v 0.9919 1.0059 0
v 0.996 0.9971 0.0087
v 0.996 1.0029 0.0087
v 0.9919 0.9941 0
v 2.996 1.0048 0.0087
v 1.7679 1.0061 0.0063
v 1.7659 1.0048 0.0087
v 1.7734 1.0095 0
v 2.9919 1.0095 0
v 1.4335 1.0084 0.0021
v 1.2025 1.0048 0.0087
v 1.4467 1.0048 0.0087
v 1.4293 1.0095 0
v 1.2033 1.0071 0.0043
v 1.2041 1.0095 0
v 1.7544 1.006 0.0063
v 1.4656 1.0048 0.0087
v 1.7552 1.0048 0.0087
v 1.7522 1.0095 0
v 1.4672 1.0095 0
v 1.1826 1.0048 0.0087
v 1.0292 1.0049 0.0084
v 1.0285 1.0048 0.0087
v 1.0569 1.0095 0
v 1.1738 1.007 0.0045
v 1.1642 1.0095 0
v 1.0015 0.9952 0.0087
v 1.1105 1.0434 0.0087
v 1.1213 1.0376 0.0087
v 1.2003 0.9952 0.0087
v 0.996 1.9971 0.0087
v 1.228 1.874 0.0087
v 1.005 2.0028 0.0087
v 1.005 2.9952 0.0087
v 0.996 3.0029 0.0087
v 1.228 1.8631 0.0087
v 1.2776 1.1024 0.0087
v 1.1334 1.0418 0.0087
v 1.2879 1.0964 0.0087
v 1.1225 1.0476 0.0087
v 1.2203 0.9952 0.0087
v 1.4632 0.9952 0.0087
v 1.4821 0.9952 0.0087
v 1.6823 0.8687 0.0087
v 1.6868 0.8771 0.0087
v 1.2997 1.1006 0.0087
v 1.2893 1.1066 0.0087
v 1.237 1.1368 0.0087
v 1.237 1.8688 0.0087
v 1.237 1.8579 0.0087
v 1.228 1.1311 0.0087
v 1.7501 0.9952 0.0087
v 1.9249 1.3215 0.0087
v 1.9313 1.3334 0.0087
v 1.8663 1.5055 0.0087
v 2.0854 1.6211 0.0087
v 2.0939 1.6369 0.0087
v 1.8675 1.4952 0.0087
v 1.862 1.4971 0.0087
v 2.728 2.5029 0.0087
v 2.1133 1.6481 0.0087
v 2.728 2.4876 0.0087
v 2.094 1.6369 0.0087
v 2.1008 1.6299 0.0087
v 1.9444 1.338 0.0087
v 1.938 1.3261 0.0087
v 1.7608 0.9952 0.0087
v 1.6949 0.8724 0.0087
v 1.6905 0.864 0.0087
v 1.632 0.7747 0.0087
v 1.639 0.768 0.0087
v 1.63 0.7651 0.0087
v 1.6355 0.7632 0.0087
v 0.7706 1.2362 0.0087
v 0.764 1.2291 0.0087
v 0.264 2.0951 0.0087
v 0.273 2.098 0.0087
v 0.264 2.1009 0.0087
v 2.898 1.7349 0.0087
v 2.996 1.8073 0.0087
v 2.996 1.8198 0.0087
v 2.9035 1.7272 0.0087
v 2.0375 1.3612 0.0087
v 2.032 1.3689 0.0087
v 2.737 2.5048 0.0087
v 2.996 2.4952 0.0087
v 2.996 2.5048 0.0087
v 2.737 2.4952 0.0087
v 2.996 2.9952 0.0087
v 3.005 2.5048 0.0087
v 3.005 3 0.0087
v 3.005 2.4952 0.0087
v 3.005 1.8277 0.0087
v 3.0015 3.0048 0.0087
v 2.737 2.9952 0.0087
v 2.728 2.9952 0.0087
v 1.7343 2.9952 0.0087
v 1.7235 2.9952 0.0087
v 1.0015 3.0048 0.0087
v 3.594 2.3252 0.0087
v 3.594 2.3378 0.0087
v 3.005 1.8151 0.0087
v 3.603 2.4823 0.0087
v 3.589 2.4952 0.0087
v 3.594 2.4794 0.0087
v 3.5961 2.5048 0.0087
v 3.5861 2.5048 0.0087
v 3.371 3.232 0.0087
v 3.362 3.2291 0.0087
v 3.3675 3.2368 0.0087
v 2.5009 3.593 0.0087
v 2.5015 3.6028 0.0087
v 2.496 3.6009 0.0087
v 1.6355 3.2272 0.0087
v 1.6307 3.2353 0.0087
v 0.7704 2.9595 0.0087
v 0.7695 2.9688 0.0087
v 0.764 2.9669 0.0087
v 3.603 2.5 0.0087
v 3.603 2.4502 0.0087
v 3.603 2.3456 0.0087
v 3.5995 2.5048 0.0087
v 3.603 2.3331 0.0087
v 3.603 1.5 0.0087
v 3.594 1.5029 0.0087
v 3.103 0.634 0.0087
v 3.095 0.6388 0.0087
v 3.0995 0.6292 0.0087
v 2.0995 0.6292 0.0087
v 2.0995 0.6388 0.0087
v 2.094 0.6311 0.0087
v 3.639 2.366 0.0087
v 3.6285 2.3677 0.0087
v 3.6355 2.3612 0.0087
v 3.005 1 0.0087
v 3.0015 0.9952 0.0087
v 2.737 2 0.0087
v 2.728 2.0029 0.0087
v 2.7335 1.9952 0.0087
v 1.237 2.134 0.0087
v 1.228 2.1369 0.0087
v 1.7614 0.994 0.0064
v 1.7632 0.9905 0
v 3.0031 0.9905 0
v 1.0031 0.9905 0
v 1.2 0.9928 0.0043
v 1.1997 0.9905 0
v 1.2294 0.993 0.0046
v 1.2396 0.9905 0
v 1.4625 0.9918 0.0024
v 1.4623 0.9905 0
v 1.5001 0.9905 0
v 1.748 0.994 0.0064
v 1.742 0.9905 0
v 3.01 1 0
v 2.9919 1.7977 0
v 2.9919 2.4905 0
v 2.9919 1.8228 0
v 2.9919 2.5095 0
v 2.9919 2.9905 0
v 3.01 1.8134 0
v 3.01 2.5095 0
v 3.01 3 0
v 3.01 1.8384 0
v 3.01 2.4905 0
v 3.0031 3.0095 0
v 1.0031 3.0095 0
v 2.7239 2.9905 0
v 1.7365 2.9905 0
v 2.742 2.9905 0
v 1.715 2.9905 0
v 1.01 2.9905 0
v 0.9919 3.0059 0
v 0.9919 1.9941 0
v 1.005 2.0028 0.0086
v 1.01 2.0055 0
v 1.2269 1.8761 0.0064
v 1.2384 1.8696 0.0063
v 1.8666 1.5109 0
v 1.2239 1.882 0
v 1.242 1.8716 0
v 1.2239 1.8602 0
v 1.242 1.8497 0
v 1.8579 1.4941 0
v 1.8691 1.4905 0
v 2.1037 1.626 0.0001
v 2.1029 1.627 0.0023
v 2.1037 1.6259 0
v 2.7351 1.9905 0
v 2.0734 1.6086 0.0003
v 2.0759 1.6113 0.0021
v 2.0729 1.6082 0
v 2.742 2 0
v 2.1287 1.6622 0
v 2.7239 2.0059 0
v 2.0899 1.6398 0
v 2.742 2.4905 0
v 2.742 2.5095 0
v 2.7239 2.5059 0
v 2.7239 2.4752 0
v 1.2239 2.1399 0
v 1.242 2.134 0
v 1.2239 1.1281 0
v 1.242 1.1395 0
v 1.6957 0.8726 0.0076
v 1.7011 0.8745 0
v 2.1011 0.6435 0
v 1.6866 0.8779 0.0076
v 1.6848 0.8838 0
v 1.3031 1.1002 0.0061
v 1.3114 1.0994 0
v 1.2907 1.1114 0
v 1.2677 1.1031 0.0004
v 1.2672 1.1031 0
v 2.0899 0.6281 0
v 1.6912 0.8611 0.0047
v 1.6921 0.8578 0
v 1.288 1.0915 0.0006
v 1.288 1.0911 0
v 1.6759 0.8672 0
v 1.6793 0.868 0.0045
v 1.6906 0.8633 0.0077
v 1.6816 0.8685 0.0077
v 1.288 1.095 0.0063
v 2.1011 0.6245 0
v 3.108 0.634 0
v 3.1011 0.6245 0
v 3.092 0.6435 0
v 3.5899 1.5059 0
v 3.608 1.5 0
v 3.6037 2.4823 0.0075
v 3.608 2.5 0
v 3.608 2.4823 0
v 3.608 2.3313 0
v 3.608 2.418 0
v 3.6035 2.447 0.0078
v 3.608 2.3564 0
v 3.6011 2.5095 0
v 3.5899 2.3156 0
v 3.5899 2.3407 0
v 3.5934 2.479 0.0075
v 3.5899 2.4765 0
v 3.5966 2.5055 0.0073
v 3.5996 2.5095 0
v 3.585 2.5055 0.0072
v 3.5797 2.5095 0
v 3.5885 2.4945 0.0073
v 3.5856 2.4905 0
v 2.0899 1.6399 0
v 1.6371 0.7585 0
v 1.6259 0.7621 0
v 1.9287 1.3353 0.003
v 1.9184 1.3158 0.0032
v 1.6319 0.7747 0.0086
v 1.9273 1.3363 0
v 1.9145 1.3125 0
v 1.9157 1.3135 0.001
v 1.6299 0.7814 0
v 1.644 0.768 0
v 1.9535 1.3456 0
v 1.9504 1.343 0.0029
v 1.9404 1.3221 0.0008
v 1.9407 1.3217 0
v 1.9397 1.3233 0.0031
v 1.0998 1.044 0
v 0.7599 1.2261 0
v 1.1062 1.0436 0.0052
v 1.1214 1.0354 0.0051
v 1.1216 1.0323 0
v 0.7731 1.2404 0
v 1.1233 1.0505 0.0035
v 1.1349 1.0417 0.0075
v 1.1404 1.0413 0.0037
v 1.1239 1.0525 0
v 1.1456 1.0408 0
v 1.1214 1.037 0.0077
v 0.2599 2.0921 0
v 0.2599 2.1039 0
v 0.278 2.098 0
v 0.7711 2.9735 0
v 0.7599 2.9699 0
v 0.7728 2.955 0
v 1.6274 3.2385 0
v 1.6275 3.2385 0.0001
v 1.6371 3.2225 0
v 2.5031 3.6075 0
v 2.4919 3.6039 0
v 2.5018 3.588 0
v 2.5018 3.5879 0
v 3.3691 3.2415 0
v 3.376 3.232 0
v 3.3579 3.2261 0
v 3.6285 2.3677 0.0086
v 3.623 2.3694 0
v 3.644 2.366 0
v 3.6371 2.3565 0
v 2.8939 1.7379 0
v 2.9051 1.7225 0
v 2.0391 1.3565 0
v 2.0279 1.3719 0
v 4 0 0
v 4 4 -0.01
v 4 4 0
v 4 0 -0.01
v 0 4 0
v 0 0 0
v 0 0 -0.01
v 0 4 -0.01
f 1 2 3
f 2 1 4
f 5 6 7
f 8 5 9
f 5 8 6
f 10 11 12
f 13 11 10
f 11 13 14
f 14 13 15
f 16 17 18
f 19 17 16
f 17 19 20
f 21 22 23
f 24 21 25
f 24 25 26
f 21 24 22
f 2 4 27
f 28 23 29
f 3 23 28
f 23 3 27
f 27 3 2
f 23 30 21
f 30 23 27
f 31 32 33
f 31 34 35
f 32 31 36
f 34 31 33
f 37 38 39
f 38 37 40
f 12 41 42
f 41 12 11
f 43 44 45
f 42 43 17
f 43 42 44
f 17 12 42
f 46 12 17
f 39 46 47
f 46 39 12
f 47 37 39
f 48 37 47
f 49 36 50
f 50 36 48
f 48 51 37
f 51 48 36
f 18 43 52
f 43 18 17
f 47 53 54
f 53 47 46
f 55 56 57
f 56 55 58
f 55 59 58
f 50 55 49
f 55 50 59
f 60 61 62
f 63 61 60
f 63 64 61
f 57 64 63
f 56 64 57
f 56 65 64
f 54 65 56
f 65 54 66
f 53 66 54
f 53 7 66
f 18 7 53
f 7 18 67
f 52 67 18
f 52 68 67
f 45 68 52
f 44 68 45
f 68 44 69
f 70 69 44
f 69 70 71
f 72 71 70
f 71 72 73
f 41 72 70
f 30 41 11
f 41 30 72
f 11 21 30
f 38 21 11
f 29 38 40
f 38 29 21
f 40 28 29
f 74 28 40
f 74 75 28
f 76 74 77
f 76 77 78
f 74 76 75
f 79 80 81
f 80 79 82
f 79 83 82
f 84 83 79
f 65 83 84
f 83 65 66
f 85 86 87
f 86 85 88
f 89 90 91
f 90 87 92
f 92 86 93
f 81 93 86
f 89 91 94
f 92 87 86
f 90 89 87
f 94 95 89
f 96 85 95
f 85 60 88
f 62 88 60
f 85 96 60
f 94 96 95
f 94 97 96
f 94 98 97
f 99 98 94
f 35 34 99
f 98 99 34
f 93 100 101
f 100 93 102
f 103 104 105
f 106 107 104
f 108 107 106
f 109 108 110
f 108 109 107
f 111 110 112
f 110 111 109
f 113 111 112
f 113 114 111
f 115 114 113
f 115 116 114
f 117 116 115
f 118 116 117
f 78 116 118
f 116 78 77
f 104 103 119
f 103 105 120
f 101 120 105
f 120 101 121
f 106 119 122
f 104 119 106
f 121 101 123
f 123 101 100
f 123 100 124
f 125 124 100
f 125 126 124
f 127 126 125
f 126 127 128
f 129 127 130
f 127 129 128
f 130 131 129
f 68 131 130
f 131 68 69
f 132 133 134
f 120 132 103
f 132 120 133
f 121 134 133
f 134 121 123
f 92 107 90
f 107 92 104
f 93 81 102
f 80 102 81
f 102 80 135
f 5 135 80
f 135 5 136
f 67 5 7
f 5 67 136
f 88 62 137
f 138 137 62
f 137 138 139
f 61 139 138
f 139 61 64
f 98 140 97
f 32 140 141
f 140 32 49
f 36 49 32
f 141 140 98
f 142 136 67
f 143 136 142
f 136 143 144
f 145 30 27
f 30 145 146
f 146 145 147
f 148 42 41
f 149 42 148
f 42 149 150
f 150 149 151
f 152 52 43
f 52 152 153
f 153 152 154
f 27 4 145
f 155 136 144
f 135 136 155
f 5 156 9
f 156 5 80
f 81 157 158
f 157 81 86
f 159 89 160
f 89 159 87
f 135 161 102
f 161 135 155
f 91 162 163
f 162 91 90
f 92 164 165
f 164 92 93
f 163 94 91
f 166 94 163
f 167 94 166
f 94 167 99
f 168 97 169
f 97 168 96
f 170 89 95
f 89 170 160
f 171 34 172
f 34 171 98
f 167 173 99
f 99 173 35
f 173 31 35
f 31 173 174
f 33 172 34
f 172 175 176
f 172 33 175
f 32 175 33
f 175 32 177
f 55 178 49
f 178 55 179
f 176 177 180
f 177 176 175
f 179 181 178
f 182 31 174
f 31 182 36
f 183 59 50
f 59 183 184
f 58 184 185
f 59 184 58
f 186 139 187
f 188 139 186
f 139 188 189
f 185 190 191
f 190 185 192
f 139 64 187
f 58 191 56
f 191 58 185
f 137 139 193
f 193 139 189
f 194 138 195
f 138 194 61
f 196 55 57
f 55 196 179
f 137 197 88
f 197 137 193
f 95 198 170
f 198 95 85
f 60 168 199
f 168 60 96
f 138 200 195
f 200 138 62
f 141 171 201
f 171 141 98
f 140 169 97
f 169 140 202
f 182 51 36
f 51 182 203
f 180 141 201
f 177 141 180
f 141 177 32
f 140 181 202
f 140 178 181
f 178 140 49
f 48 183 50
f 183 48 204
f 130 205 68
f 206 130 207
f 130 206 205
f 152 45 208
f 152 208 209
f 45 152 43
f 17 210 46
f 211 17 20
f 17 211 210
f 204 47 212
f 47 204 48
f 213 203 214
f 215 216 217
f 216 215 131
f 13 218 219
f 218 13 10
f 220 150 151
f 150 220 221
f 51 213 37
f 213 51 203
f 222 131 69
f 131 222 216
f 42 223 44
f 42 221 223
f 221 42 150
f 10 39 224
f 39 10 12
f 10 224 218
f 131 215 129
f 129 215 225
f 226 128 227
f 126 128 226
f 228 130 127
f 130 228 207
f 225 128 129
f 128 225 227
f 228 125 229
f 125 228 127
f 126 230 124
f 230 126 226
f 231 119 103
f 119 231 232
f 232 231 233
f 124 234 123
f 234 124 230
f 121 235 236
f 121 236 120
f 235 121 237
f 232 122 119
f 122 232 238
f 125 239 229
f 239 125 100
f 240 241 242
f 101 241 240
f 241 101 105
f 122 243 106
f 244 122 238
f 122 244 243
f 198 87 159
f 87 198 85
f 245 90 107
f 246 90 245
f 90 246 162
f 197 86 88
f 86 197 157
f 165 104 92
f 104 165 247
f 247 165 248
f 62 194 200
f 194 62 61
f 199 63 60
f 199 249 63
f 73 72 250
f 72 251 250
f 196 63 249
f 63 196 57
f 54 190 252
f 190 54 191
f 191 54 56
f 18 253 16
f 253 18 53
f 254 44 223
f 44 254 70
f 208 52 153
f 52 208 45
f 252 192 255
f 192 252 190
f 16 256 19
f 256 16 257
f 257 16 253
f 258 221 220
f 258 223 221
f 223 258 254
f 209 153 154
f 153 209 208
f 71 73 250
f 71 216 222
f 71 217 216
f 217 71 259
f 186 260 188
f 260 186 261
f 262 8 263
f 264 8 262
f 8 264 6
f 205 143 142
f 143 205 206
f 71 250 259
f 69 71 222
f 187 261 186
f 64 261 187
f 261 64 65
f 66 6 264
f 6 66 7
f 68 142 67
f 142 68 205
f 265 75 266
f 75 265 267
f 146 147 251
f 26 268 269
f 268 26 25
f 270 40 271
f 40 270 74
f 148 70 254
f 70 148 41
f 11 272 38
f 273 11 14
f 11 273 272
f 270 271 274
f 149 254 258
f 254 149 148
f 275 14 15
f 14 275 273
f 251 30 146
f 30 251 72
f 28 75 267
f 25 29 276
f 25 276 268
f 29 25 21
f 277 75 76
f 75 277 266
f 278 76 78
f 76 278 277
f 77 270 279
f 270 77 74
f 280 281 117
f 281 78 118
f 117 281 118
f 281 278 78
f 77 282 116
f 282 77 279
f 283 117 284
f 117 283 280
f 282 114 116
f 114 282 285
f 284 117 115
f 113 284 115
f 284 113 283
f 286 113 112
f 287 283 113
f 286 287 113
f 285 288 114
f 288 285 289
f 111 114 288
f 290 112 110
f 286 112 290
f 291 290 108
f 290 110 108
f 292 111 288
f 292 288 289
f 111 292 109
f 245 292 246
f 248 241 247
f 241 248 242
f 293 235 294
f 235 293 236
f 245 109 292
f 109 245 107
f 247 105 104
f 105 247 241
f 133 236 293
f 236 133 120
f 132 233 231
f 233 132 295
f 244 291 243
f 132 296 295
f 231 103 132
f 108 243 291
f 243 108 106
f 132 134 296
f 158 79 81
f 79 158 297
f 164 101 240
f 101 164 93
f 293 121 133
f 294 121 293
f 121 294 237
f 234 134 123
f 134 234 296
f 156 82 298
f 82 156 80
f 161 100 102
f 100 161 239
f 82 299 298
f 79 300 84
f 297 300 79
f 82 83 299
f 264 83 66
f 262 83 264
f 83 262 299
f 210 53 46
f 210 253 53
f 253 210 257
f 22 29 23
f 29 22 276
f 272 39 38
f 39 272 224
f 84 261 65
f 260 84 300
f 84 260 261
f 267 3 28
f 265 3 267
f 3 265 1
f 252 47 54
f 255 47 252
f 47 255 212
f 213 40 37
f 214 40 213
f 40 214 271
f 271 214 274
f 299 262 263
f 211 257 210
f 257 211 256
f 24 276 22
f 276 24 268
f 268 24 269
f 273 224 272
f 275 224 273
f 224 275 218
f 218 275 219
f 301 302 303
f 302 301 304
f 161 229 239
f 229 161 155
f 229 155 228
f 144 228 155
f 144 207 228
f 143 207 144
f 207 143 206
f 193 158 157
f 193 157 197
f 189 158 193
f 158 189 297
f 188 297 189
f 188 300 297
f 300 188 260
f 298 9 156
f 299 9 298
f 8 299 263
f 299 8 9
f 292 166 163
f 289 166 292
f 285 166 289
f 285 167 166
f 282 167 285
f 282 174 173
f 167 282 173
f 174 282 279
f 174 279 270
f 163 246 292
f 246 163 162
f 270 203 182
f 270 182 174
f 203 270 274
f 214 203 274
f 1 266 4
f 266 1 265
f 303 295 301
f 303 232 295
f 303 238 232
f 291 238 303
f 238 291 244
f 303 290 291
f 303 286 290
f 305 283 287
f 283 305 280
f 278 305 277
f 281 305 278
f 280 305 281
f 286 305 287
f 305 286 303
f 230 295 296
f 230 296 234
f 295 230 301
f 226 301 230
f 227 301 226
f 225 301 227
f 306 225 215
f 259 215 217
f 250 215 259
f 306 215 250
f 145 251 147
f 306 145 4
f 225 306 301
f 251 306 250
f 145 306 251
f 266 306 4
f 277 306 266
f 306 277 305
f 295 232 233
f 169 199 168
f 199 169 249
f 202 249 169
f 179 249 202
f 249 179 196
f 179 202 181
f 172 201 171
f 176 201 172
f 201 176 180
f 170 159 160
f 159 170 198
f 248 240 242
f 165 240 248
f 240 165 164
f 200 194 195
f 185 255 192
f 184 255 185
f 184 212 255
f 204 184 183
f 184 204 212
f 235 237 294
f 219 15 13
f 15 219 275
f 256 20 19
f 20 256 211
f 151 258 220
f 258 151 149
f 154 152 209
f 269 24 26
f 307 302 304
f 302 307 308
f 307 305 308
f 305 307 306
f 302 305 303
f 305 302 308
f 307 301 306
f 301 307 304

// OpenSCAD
hull(){
    translate([1, 1]) sphere(0.01);
    translate([2, 1]) sphere(0.01);
}
hull(){
    translate([2, 1]) sphere(0.01);
    translate([3, 1]) sphere(0.01);
}
hull(){
    translate([3, 1]) sphere(0.01);
    translate([3, 2]) sphere(0.01);
}
hull(){
    translate([3, 2]) sphere(0.01);
    translate([3, 3]) sphere(0.01);
}
hull(){
    translate([3, 3]) sphere(0.01);
    translate([2, 3]) sphere(0.01);
}
hull(){
    translate([2, 3]) sphere(0.01);
    translate([1, 3]) sphere(0.01);
}
hull(){
    translate([1, 3]) sphere(0.01);
    translate([1, 2]) sphere(0.01);
}
hull(){
    translate([1, 2]) sphere(0.01);
    translate([1.866, 1.5]) sphere(0.01);
}
hull(){
    translate([1.866, 1.5]) sphere(0.01);
    translate([2.732, 2]) sphere(0.01);
}
hull(){
    translate([2.732, 2]) sphere(0.01);
    translate([2.732, 3]) sphere(0.01);
}
hull(){
    translate([2.732, 3]) sphere(0.01);
    translate([1.732, 3]) sphere(0.01);
}
hull(){
    translate([1.732, 3]) sphere(0.01);
    translate([1.232, 2.134]) sphere(0.01);
}
hull(){
    translate([1.232, 2.134]) sphere(0.01);
    translate([1.232, 1.134]) sphere(0.01);
}
hull(){
    translate([1.232, 1.134]) sphere(0.01);
    translate([2.098, 0.634]) sphere(0.01);
}
hull(){
    translate([2.098, 0.634]) sphere(0.01);
    translate([3.098, 0.634]) sphere(0.01);
}
hull(){
    translate([3.098, 0.634]) sphere(0.01);
    translate([3.598, 1.5]) sphere(0.01);
}
hull(){
    translate([3.598, 1.5]) sphere(0.01);
    translate([3.598, 2.5]) sphere(0.01);
}
hull(){
    translate([3.598, 2.5]) sphere(0.01);
    translate([2.732, 2.5]) sphere(0.01);
}
hull(){
    translate([2.732, 2.5]) sphere(0.01);
    translate([2.098, 1.634]) sphere(0.01);
}
hull(){
    translate([2.098, 1.634]) sphere(0.01);
    translate([1.634, 0.768]) sphere(0.01);
}
hull(){
    translate([1.634, 0.768]) sphere(0.01);
    translate([0.768, 1.232]) sphere(0.01);
}
hull(){
    translate([0.768, 1.232]) sphere(0.01);
    translate([0.268, 2.098]) sphere(0.01);
}
hull(){
    translate([0.268, 2.098]) sphere(0.01);
    translate([0.768, 2.964]) sphere(0.01);
}
hull(){
    translate([0.768, 2.964]) sphere(0.01);
    translate([1.634, 3.232]) sphere(0.01);
}
hull(){
    translate([1.634, 3.232]) sphere(0.01);
    translate([2.5, 3.598]) sphere(0.01);
}
hull(){
    translate([2.5, 3.598]) sphere(0.01);
    translate([3.366, 3.232]) sphere(0.01);
}
hull(){
    translate([3.366, 3.232]) sphere(0.01);
    translate([3.634, 2.366]) sphere(0.01);
}
hull(){
    translate([3.634, 2.366]) sphere(0.01);
    translate([2.902, 1.732]) sphere(0.01);
}
hull(){
    translate([2.902, 1.732]) sphere(0.01);
    translate([2.036, 1.366]) sphere(0.01);
}
hull(){
    translate([2.036, 1.366]) sphere(0.01);
    translate([1, 1]) sphere(0.01);
}
translate([0,0,-0.01]) color([0.1,0.1,0.1]) cube([4,4,0.01]);
